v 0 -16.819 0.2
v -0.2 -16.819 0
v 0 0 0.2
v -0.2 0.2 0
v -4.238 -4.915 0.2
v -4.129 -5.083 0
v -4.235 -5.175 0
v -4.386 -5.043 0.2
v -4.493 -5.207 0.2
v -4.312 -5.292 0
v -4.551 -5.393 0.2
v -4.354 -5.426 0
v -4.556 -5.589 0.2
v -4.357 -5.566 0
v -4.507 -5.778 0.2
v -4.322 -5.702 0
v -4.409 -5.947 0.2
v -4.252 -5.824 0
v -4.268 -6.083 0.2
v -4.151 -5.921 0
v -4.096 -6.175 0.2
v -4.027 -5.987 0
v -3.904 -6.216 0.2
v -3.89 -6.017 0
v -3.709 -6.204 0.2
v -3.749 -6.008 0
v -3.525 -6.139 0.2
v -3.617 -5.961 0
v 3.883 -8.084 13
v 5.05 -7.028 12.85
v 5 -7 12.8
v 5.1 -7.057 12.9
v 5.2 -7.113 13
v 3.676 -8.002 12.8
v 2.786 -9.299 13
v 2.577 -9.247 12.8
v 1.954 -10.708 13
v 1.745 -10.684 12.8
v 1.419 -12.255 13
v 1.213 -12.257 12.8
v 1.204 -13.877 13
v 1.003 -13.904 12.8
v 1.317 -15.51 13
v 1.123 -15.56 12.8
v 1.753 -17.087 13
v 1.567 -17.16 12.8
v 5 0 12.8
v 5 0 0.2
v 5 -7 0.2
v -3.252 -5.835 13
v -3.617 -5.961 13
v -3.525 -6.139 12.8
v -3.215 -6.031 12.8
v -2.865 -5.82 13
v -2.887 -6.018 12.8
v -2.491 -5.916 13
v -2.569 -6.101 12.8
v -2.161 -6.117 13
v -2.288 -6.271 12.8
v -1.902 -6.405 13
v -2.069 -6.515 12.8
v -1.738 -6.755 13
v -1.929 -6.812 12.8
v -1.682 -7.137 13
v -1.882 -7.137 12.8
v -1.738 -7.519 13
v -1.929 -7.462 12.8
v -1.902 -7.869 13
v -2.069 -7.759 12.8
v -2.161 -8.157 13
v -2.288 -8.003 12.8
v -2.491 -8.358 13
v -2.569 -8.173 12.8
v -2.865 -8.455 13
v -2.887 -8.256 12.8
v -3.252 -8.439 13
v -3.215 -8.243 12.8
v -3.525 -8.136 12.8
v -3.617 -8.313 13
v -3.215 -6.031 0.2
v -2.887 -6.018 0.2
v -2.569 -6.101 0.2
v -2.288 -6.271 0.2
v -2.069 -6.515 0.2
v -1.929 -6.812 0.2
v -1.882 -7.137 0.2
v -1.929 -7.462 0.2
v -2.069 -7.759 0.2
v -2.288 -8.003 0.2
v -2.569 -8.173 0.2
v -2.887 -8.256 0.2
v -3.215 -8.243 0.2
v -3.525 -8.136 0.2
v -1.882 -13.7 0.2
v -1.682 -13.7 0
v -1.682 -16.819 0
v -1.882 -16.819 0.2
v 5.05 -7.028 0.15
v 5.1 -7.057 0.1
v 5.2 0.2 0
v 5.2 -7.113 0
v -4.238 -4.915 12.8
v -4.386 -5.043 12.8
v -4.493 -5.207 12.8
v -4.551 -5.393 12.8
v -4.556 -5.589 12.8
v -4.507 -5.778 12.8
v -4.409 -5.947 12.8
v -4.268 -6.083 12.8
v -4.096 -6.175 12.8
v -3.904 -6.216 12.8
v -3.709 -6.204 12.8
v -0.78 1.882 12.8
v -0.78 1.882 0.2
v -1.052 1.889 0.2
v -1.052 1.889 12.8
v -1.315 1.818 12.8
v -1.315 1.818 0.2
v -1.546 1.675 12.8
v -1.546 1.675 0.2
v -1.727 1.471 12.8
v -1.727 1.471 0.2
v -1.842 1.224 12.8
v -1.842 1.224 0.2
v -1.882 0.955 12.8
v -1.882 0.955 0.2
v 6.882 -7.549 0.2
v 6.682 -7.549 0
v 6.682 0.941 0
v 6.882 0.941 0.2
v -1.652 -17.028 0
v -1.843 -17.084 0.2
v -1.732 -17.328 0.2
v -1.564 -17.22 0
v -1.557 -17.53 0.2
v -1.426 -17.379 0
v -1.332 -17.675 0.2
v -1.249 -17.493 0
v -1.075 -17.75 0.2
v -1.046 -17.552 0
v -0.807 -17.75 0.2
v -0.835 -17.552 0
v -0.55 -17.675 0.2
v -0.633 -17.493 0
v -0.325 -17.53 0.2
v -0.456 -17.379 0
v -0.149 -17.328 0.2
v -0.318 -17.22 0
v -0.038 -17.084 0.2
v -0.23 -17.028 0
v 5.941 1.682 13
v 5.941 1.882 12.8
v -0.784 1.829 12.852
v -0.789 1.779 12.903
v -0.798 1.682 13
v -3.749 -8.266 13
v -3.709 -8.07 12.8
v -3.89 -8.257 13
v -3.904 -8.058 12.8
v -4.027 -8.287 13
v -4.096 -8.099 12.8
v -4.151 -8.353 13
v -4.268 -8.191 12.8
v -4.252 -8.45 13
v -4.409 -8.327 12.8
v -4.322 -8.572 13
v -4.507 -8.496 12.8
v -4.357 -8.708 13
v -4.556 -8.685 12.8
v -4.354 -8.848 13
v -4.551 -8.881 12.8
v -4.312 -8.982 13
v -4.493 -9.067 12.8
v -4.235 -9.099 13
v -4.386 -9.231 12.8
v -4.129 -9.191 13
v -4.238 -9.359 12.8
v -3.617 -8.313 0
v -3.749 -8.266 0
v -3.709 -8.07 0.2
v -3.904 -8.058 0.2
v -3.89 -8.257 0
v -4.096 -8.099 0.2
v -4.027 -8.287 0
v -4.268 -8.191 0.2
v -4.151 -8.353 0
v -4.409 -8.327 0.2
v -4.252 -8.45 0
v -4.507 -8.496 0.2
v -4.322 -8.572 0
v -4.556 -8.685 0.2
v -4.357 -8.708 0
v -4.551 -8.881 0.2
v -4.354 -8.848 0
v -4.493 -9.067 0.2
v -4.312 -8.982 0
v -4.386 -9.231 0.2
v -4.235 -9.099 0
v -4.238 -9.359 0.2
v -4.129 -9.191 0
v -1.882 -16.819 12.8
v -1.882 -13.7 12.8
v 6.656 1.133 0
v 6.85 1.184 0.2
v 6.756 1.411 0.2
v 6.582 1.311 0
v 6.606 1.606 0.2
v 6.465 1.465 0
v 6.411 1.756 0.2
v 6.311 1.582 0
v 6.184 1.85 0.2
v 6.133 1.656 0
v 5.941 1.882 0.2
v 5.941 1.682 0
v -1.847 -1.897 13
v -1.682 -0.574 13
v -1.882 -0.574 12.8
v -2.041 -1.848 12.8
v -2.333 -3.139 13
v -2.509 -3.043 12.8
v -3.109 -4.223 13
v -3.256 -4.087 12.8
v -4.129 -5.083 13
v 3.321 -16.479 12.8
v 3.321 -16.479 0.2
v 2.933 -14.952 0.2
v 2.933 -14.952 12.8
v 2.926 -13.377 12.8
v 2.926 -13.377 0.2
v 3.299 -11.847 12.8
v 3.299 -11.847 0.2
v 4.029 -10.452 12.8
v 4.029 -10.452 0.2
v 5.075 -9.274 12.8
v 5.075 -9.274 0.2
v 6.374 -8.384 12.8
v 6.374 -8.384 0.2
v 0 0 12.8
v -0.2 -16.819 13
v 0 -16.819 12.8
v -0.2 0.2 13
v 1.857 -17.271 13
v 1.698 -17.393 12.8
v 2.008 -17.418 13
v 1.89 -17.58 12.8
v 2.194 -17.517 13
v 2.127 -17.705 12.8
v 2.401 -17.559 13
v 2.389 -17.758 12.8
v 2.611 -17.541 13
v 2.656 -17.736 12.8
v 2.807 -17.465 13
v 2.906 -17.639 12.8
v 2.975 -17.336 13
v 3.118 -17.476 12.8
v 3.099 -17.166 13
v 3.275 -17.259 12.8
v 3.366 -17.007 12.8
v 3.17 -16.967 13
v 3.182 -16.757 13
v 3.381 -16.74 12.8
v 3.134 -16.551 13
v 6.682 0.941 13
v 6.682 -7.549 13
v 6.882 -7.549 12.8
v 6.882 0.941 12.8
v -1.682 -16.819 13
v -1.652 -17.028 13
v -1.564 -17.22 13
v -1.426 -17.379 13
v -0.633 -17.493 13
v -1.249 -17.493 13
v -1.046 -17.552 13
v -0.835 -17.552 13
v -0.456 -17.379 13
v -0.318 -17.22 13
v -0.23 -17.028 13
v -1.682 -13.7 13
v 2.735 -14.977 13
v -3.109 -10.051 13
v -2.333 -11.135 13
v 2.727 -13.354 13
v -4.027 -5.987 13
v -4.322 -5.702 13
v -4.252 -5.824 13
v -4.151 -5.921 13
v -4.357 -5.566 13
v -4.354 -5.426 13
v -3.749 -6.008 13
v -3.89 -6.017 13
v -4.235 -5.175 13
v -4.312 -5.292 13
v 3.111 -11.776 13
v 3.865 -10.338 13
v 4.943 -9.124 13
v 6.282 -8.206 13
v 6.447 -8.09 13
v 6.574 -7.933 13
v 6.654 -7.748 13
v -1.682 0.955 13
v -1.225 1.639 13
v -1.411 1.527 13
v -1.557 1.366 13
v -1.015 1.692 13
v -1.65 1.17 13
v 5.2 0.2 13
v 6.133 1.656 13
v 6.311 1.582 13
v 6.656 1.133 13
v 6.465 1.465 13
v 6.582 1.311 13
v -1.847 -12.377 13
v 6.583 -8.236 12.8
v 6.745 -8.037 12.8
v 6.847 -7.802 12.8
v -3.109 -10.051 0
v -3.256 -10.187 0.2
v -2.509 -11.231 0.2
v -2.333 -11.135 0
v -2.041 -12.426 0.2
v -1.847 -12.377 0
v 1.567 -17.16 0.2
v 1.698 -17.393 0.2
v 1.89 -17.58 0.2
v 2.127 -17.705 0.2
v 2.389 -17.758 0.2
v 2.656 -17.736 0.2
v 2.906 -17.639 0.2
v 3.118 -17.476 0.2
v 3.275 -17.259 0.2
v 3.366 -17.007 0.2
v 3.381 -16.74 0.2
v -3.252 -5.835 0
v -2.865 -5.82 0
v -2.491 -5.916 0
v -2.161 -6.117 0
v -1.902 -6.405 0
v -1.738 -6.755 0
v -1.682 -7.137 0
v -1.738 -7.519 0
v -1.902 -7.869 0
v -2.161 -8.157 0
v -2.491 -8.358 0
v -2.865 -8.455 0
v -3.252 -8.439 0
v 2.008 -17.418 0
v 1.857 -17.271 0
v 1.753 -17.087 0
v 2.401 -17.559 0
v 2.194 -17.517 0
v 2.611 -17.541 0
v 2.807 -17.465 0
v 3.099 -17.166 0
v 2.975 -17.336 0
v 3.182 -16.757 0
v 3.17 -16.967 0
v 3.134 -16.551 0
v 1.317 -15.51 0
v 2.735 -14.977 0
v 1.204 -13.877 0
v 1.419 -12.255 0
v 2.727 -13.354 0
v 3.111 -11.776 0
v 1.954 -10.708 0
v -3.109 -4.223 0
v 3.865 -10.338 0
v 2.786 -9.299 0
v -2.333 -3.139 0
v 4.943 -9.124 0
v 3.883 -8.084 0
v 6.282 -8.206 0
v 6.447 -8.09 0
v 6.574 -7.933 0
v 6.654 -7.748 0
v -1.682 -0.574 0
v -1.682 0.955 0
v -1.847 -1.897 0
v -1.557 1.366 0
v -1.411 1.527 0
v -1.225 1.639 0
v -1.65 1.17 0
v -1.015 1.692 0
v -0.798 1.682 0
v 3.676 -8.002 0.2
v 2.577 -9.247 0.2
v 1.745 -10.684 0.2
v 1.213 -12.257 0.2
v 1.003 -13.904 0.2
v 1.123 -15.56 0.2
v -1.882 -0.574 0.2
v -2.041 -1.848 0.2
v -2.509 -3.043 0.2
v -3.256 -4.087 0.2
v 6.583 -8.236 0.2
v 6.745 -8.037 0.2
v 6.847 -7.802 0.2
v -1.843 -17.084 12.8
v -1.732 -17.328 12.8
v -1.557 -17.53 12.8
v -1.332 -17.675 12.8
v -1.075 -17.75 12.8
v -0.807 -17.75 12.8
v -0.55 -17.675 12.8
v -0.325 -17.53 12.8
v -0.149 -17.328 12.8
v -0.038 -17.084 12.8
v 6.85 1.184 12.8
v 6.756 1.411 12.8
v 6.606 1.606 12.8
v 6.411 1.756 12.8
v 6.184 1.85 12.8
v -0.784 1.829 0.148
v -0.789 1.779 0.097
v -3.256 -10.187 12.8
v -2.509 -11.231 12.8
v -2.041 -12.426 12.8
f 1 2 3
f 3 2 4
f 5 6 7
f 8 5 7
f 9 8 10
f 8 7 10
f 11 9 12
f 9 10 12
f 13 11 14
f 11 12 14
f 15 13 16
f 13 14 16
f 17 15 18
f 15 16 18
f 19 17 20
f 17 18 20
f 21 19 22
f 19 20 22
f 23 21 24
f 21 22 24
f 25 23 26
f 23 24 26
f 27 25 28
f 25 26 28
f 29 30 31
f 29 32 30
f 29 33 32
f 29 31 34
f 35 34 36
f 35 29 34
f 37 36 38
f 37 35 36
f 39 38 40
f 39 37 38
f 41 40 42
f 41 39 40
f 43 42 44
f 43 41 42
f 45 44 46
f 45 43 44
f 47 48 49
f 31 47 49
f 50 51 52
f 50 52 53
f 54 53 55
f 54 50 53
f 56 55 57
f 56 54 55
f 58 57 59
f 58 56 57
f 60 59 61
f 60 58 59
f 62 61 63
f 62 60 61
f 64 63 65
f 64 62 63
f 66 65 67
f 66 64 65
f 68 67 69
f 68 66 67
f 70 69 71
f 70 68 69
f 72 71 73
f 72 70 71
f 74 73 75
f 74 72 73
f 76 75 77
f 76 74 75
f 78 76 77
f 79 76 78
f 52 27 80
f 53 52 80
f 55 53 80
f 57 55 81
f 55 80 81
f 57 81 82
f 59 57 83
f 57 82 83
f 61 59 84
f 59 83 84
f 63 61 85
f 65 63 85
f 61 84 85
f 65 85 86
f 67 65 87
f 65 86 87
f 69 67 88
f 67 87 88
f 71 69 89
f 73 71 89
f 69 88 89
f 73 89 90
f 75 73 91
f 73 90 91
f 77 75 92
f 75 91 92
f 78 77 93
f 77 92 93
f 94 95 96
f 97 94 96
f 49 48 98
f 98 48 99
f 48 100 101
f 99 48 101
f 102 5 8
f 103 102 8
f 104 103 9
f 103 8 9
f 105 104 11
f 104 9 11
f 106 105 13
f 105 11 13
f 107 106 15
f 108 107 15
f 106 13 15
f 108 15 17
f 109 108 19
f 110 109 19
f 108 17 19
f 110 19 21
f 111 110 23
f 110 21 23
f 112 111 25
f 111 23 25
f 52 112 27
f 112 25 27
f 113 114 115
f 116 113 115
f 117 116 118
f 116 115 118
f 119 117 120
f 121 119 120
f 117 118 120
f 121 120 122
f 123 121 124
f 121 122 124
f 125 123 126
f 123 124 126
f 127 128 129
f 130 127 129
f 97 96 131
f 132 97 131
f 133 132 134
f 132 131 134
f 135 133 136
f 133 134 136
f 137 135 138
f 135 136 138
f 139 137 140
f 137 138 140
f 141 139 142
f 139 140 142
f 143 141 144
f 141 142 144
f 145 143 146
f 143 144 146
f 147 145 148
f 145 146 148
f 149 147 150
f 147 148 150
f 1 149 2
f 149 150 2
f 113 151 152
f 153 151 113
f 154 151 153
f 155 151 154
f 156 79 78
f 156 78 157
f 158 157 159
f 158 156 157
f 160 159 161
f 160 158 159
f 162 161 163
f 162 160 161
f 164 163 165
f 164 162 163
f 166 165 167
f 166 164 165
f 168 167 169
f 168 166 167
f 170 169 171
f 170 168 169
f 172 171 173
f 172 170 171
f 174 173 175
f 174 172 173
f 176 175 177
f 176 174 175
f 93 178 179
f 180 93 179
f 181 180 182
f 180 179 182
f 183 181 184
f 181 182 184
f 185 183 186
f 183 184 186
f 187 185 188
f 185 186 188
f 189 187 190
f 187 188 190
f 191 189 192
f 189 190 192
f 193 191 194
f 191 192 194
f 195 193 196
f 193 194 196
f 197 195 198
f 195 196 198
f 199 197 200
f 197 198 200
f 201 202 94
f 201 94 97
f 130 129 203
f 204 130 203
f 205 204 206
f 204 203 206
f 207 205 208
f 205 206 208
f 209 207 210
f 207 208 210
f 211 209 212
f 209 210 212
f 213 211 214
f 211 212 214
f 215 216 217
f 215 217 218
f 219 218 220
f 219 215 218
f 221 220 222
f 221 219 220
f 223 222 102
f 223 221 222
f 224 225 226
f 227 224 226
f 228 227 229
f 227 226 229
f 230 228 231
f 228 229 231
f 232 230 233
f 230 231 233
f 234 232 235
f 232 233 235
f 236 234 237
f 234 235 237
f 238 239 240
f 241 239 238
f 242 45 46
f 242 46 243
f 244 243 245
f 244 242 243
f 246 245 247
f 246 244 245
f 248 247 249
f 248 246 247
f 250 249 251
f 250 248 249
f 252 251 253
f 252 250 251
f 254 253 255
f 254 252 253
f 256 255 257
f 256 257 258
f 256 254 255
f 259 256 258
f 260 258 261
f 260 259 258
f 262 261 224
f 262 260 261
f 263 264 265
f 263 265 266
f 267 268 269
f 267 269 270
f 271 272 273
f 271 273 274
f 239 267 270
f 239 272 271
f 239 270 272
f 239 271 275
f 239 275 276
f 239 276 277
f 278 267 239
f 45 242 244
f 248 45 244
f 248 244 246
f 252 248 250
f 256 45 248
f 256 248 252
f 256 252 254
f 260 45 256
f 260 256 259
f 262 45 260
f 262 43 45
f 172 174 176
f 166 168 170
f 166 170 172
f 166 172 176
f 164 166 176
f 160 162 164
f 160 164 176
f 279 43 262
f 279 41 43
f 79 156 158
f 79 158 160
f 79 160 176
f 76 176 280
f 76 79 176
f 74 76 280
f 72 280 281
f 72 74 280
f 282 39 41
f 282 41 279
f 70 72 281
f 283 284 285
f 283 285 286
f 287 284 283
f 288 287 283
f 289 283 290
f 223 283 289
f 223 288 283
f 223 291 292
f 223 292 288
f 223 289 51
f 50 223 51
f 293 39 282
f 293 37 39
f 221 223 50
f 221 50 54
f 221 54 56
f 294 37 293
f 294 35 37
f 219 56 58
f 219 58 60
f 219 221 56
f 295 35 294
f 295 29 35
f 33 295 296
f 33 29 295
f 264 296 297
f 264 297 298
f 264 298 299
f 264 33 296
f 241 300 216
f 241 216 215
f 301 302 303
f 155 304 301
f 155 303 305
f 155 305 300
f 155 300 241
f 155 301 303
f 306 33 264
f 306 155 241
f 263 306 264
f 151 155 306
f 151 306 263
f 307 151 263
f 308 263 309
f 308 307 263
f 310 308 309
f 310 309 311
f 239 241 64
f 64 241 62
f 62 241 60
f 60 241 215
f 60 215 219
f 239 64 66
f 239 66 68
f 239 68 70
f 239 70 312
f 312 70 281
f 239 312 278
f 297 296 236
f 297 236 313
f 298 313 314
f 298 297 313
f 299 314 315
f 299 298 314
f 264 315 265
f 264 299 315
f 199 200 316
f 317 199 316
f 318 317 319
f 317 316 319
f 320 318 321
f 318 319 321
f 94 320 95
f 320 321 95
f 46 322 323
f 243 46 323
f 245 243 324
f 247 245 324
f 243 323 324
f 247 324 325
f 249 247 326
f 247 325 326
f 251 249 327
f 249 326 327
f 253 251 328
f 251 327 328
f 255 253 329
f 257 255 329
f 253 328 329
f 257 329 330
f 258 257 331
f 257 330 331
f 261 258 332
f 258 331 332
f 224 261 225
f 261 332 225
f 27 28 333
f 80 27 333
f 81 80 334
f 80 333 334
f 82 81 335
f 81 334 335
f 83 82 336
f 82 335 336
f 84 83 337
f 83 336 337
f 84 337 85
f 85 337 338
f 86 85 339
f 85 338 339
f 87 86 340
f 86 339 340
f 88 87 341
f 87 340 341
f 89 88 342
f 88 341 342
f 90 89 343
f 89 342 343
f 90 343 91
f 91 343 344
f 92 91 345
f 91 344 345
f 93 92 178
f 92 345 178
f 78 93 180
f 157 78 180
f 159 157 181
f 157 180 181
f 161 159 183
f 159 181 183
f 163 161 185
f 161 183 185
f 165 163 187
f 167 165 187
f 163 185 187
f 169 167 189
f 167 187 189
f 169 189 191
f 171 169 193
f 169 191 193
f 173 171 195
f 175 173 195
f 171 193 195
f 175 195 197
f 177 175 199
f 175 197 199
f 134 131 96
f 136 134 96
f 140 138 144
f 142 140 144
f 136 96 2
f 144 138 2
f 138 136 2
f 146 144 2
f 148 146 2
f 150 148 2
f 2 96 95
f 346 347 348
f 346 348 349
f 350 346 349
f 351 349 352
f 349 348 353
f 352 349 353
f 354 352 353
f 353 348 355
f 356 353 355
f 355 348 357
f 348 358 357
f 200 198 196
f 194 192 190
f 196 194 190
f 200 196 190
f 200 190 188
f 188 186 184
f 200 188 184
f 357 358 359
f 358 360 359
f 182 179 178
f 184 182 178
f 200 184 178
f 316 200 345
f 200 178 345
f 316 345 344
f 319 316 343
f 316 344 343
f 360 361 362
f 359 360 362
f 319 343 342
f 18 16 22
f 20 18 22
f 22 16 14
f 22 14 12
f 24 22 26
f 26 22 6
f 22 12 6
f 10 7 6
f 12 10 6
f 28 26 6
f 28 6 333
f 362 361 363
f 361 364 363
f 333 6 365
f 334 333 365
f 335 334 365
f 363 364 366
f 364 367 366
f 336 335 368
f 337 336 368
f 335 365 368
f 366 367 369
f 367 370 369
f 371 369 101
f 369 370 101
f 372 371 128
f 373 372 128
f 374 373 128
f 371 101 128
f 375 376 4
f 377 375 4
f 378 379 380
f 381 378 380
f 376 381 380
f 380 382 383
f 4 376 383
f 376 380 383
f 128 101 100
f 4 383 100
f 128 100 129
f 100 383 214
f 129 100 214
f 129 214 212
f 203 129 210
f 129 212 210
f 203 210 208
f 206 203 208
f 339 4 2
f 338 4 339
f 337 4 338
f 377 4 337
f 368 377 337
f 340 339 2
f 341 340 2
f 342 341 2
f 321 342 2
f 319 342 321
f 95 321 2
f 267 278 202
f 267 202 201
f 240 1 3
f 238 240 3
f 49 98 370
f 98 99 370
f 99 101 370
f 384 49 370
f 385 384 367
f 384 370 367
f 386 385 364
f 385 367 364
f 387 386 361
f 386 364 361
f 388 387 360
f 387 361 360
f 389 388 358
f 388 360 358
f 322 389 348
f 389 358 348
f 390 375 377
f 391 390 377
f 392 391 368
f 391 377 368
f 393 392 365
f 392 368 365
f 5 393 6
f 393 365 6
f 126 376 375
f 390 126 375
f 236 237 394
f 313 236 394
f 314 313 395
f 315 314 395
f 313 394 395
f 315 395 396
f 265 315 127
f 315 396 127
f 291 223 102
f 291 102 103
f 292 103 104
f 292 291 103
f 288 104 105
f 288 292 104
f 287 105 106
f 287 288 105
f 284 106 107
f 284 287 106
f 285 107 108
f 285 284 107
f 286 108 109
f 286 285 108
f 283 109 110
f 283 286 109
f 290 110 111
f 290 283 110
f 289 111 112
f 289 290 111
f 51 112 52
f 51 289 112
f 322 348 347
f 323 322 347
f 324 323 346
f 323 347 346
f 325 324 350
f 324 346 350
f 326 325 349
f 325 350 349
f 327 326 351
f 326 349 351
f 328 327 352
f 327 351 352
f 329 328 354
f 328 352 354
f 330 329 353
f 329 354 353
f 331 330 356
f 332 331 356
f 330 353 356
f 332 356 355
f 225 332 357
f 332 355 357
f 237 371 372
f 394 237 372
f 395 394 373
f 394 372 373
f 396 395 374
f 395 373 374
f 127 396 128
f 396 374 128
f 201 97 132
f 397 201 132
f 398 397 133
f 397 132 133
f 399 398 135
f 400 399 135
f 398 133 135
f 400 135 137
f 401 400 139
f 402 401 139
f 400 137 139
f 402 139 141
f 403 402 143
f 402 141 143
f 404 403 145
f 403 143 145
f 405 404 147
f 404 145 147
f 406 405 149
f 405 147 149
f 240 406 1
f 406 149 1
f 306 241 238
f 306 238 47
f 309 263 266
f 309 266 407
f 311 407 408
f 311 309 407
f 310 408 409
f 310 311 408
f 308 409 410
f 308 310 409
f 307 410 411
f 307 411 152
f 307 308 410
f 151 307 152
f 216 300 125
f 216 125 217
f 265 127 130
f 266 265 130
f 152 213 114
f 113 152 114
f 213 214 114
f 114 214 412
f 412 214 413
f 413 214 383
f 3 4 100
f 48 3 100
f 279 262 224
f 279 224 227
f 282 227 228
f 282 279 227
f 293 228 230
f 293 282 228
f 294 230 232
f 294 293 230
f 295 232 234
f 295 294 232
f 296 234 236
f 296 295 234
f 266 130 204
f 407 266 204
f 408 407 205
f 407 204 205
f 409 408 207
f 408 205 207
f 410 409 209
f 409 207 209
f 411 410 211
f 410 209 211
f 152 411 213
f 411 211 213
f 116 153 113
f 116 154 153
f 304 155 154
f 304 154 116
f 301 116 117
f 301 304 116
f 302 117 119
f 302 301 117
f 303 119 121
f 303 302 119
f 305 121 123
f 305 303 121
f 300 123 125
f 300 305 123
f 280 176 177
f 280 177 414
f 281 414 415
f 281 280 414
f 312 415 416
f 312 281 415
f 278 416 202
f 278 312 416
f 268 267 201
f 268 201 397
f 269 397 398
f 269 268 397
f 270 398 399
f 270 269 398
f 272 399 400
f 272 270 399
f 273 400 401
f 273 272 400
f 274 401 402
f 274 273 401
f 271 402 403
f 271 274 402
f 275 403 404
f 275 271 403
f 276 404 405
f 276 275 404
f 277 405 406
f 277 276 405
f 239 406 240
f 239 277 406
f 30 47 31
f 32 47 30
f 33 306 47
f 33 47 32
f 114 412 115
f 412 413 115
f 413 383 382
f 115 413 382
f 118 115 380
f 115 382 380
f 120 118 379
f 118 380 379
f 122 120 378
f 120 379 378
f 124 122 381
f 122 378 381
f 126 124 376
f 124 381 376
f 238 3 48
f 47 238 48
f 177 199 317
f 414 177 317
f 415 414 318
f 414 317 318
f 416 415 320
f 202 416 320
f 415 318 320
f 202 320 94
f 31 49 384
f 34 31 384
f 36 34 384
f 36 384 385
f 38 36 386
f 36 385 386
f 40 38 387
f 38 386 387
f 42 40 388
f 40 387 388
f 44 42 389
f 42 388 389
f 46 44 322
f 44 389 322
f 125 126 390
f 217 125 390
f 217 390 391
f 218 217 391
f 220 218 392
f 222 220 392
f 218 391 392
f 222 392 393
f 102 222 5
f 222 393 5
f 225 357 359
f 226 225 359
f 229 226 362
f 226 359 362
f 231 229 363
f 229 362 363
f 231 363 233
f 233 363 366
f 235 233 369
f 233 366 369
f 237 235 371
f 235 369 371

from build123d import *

# Parameters (mm, degrees)
F1_DEPTH = 13
F2_SIZE  = 0.2


with BuildPart() as f1:
    # F0 (on Top) → F1 (new body)
    with BuildSketch(Plane.XY):
        with BuildLine():
            ThreePointArc((-1.8816, -16.819208), (-0.9408, -17.760008), (0, -16.819208))
            Line((0, -16.819208), (0, 0))
            Line((0, 0), (5, 0))
            Line((5, 0), (5, -7))
            ThreePointArc((5, -7), (1.440063, -11.456932), (1.566748, -17.159682))
            ThreePointArc((1.566748, -17.159682), (2.784253, -17.696238), (3.320809, -16.478734))
            ThreePointArc((3.320809, -16.478734), (3.298597, -11.846796), (6.374464, -8.383506))
            ThreePointArc((6.374464, -8.383506), (6.744882, -8.037039), (6.8816, -7.548616))
            Line((6.8816, -7.548616), (6.8816, 0.9408))
            ThreePointArc((6.8816, 0.9408), (6.606046, 1.606046), (5.9408, 1.8816))
            Line((5.9408, 1.8816), (-0.779544, 1.8816))
            ThreePointArc((-0.779544, 1.8816), (-1.546355, 1.674728), (-1.8816, 0.954723))
            Line((-1.8816, 0.954723), (-1.8816, -0.573602))
            ThreePointArc((-1.8816, -0.573602), (-2.508632, -3.043383), (-4.237854, -4.914955))
            ThreePointArc((-4.237854, -4.914955), (-4.464092, -5.866265), (-3.524931, -6.13857))
            ThreePointArc((-3.524931, -6.13857), (-1.8816, -7.137048), (-3.524931, -8.135526))
            ThreePointArc((-3.524931, -8.135526), (-4.464092, -8.407832), (-4.237854, -9.359142))
            ThreePointArc((-4.237854, -9.359142), (-2.508632, -11.230713), (-1.8816, -13.700494))
            Line((-1.8816, -13.700494), (-1.8816, -16.819208))
        make_face()
    extrude(amount=F1_DEPTH)

    # F2
    f2_edges = [f1.edges().sort_by_distance(p)[0] for p in [
        (-2.508632, -11.230713, 0),
        (-1.8816, -15.259851, 0),
        (-0.9408, -17.760008, 0),
        (0, -8.409604, 0),
        (2.5, 0, 0),
        (5, -3.5, 0),
        (1.440063, -11.456932, 0),
        (2.784253, -17.696238, 0),
        (3.298597, -11.846796, 0),
        (6.744882, -8.037039, 0),
        (6.8816, -3.303908, 0),
        (6.606046, 1.606046, 0),
        (2.580628, 1.8816, 0),
        (-1.546355, 1.674728, 0),
        (-1.8816, 0.19056, 0),
        (-2.508632, -3.043383, 0),
        (-4.464092, -5.866265, 0),
        (-1.8816, -7.137048, 0),
        (-4.464092, -8.407832, 0),
        (-2.508632, -11.230713, 13),
        (-1.8816, -15.259851, 13),
        (-0.9408, -17.760008, 13),
        (0, -8.409604, 13),
        (2.5, 0, 13),
        (5, -3.5, 13),
        (1.440063, -11.456932, 13),
        (2.784253, -17.696238, 13),
        (3.298597, -11.846796, 13),
        (6.744882, -8.037039, 13),
        (6.8816, -3.303908, 13),
        (6.606046, 1.606046, 13),
        (2.580628, 1.8816, 13),
        (-1.546355, 1.674728, 13),
        (-1.8816, 0.19056, 13),
        (-2.508632, -3.043383, 13),
        (-4.464092, -5.866265, 13),
        (-1.8816, -7.137048, 13),
        (-4.464092, -8.407832, 13),
    ]]
    chamfer(f2_edges, length=F2_SIZE)


solid = f1.part
